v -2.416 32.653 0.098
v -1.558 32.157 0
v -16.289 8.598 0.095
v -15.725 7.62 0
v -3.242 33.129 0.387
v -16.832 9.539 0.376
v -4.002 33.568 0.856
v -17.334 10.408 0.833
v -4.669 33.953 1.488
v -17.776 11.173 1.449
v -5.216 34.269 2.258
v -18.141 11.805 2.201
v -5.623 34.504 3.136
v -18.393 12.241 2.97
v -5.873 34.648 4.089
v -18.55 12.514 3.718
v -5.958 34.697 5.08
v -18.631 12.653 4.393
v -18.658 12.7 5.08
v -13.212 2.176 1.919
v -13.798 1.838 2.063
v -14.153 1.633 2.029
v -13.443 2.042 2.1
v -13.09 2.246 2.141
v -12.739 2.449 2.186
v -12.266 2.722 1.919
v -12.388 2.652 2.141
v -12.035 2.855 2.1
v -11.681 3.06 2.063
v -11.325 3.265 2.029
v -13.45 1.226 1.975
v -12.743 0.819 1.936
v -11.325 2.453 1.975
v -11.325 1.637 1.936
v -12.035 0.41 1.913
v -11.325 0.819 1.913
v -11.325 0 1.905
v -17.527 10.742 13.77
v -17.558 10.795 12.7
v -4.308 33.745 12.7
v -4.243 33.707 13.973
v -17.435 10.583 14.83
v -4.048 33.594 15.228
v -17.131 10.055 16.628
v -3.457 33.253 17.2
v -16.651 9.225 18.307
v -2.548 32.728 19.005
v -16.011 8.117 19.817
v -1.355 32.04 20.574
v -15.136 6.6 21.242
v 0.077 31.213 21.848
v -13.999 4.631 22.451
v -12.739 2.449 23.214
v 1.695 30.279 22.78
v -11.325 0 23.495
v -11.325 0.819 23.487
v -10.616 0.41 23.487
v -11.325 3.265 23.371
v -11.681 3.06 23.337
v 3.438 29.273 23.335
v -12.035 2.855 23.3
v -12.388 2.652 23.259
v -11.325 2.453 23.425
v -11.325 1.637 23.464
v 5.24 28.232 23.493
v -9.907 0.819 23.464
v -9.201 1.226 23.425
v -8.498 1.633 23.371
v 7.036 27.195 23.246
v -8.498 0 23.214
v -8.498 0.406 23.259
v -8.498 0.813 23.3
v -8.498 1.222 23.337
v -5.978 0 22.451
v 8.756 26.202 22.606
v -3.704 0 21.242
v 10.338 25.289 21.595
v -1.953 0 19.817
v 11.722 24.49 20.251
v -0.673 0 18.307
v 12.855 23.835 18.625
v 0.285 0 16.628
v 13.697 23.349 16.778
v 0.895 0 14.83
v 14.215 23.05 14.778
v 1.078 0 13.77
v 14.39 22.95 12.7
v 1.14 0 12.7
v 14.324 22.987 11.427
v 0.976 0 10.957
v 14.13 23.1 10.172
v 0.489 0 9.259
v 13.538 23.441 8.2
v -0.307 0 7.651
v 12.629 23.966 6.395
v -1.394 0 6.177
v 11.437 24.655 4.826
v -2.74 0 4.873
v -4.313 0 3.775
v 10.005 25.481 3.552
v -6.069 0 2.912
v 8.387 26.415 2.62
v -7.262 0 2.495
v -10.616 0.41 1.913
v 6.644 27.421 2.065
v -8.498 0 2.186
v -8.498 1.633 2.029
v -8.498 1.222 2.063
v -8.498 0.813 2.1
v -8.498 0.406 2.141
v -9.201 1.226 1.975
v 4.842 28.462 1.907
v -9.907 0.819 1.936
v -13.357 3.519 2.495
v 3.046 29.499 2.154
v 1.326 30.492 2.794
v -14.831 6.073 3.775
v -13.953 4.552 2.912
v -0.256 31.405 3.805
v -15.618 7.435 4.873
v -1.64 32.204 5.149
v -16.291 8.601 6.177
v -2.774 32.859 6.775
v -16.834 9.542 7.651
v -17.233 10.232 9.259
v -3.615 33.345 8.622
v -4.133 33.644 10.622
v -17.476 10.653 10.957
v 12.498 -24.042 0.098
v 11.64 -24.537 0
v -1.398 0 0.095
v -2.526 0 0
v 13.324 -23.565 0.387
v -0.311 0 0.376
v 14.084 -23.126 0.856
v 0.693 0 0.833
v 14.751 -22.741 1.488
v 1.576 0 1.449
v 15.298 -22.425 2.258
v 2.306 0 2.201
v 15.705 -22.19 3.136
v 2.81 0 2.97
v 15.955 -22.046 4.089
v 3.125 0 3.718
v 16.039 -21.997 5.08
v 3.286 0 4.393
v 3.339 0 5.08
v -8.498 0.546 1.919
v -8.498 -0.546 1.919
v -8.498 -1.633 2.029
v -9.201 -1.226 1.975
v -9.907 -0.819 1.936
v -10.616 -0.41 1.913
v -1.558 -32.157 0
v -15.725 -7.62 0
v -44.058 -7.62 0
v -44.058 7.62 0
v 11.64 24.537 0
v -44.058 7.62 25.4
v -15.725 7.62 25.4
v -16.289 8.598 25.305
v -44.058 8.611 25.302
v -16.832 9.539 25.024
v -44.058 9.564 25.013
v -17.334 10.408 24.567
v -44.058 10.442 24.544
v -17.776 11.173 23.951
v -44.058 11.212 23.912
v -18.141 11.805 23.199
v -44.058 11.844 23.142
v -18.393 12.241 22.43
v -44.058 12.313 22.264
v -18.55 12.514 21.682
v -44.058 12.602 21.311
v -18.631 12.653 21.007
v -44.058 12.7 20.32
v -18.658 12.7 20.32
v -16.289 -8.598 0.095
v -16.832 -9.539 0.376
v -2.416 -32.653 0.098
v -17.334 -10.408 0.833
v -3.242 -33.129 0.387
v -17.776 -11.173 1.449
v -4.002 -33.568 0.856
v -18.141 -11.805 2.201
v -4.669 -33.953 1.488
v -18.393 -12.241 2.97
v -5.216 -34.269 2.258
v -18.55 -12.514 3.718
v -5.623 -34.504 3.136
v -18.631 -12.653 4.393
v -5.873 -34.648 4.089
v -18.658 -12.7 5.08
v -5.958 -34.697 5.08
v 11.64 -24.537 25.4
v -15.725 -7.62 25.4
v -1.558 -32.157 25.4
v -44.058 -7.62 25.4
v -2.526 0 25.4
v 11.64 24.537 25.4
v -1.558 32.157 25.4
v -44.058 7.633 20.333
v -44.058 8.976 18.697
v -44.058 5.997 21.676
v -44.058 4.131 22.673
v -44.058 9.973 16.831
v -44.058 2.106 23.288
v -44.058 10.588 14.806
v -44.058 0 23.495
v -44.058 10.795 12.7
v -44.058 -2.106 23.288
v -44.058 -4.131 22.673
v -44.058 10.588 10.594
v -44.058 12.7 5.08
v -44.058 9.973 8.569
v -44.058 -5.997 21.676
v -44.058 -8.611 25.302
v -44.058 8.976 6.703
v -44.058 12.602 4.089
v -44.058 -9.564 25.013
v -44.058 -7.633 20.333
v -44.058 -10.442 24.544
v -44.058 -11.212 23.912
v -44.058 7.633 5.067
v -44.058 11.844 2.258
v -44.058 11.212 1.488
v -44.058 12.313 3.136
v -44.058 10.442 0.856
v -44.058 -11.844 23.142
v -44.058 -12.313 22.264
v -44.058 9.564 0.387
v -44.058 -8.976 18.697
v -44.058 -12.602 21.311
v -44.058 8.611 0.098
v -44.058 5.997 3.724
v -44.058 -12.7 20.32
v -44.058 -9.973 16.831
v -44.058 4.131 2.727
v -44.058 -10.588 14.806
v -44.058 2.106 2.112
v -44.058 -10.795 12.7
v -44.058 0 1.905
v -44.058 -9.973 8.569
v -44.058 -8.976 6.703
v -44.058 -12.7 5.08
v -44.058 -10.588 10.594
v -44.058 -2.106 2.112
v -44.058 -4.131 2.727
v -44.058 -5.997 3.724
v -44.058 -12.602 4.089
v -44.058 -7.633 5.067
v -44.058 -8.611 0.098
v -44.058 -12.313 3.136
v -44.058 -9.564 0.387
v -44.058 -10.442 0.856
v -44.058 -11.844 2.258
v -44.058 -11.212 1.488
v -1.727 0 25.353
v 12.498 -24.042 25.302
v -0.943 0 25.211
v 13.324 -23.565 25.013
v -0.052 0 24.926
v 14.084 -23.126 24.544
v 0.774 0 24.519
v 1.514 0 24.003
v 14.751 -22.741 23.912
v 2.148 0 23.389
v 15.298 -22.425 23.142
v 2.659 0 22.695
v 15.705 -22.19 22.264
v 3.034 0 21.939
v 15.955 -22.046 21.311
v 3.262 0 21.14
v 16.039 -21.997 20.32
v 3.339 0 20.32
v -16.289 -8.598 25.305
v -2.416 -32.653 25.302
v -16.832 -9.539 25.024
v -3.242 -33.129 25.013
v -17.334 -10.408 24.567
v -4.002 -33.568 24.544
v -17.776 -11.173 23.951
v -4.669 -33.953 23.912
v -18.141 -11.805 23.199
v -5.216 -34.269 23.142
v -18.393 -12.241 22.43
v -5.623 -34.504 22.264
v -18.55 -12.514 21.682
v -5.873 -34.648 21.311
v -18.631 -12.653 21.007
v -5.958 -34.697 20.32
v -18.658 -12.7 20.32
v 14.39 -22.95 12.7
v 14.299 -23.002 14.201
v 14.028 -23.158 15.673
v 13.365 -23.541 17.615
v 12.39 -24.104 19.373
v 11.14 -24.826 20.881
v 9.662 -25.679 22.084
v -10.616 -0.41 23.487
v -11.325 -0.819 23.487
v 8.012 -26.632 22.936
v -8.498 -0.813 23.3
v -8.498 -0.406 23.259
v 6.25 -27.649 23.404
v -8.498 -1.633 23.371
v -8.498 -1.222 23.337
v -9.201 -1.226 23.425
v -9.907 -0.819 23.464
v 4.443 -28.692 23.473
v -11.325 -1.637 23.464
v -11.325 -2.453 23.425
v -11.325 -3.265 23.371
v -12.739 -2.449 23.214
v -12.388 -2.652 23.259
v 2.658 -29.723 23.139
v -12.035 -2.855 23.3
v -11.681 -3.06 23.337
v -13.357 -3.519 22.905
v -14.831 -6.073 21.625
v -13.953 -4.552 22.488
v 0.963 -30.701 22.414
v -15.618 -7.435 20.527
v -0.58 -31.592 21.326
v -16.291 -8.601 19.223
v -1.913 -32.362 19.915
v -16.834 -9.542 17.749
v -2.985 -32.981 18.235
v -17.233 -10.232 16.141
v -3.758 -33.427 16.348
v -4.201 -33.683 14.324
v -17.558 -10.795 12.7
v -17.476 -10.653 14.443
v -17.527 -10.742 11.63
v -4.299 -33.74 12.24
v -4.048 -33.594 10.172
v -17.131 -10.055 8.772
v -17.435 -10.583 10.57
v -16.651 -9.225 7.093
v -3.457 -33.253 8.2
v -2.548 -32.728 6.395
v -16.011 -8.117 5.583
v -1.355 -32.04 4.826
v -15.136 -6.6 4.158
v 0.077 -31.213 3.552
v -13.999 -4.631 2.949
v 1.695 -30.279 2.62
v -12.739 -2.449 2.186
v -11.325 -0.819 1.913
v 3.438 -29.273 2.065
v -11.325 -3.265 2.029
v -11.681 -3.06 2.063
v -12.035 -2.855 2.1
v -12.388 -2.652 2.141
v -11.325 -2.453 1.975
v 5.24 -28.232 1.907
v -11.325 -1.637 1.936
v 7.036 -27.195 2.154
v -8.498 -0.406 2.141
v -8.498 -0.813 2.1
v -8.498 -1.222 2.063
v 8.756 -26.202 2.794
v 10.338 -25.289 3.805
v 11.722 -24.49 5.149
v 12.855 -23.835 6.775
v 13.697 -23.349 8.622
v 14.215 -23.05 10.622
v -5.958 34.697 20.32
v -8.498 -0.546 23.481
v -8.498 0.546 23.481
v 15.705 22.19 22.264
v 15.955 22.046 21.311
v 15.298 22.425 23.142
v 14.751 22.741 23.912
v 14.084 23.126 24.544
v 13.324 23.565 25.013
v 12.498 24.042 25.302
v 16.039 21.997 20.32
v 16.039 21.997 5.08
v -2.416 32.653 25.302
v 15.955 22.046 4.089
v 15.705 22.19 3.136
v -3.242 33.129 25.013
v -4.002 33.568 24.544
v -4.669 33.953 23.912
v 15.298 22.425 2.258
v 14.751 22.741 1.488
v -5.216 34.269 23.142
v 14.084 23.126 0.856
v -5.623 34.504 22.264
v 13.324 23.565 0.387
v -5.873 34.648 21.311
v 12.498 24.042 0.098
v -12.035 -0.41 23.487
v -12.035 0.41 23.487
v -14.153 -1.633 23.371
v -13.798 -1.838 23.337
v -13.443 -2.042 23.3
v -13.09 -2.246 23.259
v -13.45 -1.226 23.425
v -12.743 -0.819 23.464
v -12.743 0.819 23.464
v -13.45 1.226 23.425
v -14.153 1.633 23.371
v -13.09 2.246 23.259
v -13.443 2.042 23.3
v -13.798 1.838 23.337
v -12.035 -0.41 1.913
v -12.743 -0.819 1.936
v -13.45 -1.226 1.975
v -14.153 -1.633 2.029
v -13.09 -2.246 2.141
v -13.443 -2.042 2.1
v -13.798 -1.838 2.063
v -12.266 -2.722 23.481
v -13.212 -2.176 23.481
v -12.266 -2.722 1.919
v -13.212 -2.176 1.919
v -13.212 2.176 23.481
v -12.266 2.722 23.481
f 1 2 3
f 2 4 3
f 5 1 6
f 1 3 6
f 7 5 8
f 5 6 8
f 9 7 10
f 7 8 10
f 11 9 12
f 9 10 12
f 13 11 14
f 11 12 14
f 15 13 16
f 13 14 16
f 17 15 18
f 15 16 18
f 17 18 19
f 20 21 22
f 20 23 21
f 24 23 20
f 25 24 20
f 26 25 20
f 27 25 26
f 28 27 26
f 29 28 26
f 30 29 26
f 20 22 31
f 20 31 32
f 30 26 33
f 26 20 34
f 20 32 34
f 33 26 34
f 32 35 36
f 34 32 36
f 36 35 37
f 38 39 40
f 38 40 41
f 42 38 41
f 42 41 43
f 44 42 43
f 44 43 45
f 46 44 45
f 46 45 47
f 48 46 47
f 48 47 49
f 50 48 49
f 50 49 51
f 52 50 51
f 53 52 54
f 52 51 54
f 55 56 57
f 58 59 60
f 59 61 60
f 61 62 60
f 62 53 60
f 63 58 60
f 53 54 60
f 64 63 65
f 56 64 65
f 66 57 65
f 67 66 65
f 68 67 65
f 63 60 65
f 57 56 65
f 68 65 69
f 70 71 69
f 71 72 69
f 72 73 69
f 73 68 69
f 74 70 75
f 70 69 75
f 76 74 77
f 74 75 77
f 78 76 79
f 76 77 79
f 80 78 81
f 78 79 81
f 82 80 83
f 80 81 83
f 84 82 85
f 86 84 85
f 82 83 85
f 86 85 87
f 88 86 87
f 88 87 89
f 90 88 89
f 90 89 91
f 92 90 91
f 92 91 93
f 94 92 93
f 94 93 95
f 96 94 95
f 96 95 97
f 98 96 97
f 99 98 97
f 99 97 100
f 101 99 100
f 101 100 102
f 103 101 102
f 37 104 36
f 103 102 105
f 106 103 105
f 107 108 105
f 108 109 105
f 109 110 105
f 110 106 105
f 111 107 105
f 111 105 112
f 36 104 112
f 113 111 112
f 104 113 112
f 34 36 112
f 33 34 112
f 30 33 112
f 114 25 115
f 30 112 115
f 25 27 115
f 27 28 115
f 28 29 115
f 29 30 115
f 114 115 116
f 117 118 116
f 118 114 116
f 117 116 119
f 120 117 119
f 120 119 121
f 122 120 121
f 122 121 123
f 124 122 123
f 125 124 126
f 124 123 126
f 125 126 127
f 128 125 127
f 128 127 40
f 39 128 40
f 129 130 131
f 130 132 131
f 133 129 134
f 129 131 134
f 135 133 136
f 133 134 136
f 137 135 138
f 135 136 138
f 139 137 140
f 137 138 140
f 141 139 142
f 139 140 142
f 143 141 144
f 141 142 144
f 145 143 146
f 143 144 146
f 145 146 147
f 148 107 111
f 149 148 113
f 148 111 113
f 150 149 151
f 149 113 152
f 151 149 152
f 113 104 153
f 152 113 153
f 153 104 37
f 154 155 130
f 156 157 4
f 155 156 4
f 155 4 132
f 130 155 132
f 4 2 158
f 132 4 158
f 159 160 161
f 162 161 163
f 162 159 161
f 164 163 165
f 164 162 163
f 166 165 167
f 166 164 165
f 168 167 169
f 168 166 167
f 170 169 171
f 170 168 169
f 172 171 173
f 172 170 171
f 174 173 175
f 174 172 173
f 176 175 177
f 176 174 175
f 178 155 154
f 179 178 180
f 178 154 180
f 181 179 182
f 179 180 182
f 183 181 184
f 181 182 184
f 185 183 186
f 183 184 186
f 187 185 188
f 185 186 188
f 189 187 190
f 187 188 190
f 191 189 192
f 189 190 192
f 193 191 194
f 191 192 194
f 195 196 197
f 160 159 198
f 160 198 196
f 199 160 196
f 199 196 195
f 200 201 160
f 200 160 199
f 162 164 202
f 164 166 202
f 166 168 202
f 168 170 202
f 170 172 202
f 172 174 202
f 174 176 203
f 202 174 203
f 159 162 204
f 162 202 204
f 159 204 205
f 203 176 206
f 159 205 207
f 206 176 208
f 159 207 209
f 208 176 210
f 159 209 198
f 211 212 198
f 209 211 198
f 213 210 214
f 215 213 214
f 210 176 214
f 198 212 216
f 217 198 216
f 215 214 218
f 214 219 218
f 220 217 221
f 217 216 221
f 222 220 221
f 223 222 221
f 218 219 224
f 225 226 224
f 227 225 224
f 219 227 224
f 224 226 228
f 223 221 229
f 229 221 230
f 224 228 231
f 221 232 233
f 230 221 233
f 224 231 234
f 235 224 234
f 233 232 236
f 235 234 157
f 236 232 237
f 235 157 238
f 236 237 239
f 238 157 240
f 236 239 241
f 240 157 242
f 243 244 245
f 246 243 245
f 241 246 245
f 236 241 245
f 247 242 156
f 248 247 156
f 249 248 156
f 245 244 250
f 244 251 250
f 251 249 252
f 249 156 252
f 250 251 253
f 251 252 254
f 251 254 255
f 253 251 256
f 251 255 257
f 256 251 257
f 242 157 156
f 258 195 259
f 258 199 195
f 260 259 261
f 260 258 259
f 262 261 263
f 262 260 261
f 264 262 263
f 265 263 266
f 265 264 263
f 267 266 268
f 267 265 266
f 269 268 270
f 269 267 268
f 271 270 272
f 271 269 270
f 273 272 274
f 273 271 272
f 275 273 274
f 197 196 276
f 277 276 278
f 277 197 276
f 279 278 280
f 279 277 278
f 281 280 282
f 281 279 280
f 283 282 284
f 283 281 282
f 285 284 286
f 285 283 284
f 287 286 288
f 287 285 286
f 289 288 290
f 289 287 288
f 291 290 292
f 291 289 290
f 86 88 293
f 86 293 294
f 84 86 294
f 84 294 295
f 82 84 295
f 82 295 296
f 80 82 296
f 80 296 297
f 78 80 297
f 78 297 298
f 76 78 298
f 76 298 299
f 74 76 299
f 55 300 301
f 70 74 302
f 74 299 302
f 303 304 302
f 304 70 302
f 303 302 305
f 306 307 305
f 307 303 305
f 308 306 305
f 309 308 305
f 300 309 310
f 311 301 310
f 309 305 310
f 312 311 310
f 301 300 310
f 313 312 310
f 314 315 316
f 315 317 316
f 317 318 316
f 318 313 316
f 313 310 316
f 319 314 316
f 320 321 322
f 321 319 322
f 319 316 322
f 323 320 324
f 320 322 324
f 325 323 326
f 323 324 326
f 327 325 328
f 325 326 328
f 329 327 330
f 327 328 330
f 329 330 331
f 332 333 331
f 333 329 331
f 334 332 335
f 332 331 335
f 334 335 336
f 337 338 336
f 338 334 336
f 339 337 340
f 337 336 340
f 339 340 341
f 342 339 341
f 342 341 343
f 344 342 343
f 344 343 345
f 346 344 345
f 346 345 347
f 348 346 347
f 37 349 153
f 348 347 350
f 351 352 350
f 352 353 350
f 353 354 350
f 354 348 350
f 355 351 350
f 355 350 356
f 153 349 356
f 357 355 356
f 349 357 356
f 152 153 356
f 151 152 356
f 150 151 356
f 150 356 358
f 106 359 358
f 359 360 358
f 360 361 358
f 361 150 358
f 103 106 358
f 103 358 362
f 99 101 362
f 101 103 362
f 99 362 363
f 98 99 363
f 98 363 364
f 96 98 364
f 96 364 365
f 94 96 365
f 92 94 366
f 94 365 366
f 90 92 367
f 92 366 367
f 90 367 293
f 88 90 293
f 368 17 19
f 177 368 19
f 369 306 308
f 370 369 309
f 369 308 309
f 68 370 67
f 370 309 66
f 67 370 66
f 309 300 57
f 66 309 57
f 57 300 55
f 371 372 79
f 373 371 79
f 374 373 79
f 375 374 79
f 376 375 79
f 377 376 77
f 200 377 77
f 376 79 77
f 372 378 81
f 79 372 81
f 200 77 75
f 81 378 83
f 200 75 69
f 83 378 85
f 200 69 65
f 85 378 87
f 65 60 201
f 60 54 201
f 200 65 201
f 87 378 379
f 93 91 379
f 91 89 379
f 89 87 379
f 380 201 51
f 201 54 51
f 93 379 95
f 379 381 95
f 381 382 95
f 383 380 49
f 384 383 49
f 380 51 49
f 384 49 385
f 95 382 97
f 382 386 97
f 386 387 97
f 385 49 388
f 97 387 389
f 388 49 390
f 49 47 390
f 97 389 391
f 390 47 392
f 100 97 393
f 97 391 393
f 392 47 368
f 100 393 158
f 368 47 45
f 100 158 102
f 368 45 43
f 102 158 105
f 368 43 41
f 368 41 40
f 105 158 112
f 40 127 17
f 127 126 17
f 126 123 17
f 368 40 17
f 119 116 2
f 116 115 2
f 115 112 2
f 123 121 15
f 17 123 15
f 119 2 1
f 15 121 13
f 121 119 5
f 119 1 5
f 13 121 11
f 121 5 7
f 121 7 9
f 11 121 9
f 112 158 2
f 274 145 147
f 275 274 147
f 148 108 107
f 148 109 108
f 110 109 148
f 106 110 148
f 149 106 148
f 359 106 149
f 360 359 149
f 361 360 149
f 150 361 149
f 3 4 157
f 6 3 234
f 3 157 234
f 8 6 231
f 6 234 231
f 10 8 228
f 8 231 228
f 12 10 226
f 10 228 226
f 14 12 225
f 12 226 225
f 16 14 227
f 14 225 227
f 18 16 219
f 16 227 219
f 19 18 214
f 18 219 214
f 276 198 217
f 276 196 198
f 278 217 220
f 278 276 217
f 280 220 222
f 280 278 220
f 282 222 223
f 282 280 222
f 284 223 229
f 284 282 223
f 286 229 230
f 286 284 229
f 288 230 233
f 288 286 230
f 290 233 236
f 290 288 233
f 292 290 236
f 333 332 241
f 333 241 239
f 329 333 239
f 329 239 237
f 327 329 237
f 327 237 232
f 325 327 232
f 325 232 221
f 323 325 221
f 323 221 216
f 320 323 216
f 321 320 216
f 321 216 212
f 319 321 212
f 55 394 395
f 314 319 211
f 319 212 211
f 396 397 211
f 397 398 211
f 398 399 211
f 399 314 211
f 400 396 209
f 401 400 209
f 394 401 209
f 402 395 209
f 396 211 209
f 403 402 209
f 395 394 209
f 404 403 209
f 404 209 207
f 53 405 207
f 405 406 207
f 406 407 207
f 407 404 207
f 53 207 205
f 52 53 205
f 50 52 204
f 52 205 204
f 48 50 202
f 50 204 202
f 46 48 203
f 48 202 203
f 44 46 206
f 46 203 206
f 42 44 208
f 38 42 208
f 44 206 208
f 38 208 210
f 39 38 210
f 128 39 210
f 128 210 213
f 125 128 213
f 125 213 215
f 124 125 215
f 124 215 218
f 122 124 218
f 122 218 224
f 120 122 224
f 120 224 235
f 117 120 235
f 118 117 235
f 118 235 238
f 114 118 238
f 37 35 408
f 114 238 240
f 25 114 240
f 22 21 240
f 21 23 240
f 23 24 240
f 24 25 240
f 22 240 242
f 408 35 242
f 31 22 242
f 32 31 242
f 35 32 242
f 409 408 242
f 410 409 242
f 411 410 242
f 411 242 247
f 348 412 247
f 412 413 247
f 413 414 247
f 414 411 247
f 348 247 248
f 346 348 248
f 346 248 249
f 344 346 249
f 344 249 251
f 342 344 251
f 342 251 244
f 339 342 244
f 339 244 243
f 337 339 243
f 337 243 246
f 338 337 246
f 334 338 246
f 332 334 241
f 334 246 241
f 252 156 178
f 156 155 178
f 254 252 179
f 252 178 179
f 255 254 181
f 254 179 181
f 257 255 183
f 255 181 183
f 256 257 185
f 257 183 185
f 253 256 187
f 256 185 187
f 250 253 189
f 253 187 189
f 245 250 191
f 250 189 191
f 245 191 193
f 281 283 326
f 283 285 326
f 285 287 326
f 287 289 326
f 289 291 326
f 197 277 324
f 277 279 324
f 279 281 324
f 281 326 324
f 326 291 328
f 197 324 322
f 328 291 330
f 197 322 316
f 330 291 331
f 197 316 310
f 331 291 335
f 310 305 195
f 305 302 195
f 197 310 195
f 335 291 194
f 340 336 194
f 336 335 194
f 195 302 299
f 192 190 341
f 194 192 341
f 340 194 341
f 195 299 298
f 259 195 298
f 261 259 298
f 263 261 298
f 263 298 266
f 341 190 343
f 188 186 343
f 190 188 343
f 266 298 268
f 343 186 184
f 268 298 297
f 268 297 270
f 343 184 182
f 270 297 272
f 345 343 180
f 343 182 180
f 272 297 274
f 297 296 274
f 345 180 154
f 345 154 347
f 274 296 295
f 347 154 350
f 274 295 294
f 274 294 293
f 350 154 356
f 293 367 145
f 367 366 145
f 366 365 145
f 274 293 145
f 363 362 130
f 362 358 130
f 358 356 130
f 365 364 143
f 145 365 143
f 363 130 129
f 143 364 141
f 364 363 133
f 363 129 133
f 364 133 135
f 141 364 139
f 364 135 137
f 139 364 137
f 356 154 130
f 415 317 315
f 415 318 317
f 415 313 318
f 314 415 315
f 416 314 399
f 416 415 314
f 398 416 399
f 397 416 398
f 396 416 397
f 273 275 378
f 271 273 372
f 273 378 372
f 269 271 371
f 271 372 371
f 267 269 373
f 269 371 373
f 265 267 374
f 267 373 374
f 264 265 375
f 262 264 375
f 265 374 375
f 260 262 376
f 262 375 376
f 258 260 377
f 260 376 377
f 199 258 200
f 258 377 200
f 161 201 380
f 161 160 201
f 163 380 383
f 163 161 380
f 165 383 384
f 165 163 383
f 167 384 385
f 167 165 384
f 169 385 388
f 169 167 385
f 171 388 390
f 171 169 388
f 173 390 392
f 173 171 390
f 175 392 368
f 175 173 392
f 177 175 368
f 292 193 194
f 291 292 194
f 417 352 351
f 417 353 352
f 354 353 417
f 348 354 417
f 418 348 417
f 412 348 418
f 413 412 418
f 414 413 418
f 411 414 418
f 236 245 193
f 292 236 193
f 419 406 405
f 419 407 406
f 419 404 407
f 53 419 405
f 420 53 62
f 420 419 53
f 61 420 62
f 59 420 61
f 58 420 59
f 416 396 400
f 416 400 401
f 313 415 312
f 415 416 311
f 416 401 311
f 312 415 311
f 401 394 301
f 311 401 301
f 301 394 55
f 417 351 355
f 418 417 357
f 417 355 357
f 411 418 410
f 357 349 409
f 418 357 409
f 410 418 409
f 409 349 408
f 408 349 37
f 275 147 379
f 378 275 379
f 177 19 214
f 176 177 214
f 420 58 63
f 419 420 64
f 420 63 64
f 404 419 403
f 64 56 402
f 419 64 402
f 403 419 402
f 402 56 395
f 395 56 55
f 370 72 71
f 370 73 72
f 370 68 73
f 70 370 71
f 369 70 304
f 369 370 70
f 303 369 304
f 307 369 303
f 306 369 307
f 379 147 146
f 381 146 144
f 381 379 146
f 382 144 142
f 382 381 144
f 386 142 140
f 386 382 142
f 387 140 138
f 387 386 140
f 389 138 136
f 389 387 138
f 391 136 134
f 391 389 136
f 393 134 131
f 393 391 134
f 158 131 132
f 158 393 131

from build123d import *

# Parameters (mm, degrees)
F1_DEPTH = 25.4
F4_R     = 10.795
F5_DEPTH = 35.56
F3_R     = 10.795
F6_DEPTH = 35.56
F2_R     = 10.795
F7_DEPTH = 35.56
F8_R     = 5.08


with BuildPart() as f1:
    # F0 (on Top) → F1 (new body)
    with BuildSketch(Plane.XY):
        Polygon((16.03946, 21.997045), (-5.957585, 34.697045), (-18.657585, 12.7), (-44.057585, 12.7), (-44.057585, -12.7), (-18.657585, -12.7), (-5.957585, -34.697045), (16.03946, -21.997045), (3.33946, 0), align=None)
    extrude(amount=F1_DEPTH)

    # F4 (on face) → F5 (cut)
    with BuildSketch(Plane(origin=(-44.057585, 0, 0), x_dir=(0, -1, 0), z_dir=(-1, 0, 0))):
        with Locations((0, 12.7)):
            Circle(F4_R)
    extrude(amount=-F5_DEPTH, mode=Mode.SUBTRACT)

    # F3 (on face) → F6 (cut)
    with BuildSketch(Plane(origin=(13.534865, 23.443074, 0), x_dir=(-0.866025, 0.5, 0), z_dir=(0.5, 0.866025, 0))):
        with Locations((9.807943, 12.7)):
            Circle(F3_R)
    extrude(amount=-F6_DEPTH, mode=Mode.SUBTRACT)

    # F2 (on face) → F7 (cut)
    with BuildSketch(Plane(origin=(13.534865, -23.443074, 0), x_dir=(0.866025, 0.5, 0), z_dir=(0.5, -0.866025, 0))):
        with Locations((-9.807943, 12.7)):
            Circle(F2_R)
    extrude(amount=-F7_DEPTH, mode=Mode.SUBTRACT)

    # F8
    f8_edges = [f1.edges().sort_by_distance(p)[0] for p in [
        (-31.357585, -12.7, 25.4),
        (-12.307585, -23.698523, 25.4),
        (-31.357585, 12.7, 25.4),
        (-12.307585, 23.698523, 25.4),
        (9.68946, 10.998523, 25.4),
        (9.68946, -10.998523, 25.4),
        (-31.357585, -12.7, 0),
        (-12.307585, -23.698523, 0),
        (9.68946, -10.998523, 0),
        (9.68946, 10.998523, 0),
        (-31.357585, 12.7, 0),
        (-12.307585, 23.698523, 0),
    ]]
    fillet(f8_edges, radius=F8_R)


solid = f1.part
